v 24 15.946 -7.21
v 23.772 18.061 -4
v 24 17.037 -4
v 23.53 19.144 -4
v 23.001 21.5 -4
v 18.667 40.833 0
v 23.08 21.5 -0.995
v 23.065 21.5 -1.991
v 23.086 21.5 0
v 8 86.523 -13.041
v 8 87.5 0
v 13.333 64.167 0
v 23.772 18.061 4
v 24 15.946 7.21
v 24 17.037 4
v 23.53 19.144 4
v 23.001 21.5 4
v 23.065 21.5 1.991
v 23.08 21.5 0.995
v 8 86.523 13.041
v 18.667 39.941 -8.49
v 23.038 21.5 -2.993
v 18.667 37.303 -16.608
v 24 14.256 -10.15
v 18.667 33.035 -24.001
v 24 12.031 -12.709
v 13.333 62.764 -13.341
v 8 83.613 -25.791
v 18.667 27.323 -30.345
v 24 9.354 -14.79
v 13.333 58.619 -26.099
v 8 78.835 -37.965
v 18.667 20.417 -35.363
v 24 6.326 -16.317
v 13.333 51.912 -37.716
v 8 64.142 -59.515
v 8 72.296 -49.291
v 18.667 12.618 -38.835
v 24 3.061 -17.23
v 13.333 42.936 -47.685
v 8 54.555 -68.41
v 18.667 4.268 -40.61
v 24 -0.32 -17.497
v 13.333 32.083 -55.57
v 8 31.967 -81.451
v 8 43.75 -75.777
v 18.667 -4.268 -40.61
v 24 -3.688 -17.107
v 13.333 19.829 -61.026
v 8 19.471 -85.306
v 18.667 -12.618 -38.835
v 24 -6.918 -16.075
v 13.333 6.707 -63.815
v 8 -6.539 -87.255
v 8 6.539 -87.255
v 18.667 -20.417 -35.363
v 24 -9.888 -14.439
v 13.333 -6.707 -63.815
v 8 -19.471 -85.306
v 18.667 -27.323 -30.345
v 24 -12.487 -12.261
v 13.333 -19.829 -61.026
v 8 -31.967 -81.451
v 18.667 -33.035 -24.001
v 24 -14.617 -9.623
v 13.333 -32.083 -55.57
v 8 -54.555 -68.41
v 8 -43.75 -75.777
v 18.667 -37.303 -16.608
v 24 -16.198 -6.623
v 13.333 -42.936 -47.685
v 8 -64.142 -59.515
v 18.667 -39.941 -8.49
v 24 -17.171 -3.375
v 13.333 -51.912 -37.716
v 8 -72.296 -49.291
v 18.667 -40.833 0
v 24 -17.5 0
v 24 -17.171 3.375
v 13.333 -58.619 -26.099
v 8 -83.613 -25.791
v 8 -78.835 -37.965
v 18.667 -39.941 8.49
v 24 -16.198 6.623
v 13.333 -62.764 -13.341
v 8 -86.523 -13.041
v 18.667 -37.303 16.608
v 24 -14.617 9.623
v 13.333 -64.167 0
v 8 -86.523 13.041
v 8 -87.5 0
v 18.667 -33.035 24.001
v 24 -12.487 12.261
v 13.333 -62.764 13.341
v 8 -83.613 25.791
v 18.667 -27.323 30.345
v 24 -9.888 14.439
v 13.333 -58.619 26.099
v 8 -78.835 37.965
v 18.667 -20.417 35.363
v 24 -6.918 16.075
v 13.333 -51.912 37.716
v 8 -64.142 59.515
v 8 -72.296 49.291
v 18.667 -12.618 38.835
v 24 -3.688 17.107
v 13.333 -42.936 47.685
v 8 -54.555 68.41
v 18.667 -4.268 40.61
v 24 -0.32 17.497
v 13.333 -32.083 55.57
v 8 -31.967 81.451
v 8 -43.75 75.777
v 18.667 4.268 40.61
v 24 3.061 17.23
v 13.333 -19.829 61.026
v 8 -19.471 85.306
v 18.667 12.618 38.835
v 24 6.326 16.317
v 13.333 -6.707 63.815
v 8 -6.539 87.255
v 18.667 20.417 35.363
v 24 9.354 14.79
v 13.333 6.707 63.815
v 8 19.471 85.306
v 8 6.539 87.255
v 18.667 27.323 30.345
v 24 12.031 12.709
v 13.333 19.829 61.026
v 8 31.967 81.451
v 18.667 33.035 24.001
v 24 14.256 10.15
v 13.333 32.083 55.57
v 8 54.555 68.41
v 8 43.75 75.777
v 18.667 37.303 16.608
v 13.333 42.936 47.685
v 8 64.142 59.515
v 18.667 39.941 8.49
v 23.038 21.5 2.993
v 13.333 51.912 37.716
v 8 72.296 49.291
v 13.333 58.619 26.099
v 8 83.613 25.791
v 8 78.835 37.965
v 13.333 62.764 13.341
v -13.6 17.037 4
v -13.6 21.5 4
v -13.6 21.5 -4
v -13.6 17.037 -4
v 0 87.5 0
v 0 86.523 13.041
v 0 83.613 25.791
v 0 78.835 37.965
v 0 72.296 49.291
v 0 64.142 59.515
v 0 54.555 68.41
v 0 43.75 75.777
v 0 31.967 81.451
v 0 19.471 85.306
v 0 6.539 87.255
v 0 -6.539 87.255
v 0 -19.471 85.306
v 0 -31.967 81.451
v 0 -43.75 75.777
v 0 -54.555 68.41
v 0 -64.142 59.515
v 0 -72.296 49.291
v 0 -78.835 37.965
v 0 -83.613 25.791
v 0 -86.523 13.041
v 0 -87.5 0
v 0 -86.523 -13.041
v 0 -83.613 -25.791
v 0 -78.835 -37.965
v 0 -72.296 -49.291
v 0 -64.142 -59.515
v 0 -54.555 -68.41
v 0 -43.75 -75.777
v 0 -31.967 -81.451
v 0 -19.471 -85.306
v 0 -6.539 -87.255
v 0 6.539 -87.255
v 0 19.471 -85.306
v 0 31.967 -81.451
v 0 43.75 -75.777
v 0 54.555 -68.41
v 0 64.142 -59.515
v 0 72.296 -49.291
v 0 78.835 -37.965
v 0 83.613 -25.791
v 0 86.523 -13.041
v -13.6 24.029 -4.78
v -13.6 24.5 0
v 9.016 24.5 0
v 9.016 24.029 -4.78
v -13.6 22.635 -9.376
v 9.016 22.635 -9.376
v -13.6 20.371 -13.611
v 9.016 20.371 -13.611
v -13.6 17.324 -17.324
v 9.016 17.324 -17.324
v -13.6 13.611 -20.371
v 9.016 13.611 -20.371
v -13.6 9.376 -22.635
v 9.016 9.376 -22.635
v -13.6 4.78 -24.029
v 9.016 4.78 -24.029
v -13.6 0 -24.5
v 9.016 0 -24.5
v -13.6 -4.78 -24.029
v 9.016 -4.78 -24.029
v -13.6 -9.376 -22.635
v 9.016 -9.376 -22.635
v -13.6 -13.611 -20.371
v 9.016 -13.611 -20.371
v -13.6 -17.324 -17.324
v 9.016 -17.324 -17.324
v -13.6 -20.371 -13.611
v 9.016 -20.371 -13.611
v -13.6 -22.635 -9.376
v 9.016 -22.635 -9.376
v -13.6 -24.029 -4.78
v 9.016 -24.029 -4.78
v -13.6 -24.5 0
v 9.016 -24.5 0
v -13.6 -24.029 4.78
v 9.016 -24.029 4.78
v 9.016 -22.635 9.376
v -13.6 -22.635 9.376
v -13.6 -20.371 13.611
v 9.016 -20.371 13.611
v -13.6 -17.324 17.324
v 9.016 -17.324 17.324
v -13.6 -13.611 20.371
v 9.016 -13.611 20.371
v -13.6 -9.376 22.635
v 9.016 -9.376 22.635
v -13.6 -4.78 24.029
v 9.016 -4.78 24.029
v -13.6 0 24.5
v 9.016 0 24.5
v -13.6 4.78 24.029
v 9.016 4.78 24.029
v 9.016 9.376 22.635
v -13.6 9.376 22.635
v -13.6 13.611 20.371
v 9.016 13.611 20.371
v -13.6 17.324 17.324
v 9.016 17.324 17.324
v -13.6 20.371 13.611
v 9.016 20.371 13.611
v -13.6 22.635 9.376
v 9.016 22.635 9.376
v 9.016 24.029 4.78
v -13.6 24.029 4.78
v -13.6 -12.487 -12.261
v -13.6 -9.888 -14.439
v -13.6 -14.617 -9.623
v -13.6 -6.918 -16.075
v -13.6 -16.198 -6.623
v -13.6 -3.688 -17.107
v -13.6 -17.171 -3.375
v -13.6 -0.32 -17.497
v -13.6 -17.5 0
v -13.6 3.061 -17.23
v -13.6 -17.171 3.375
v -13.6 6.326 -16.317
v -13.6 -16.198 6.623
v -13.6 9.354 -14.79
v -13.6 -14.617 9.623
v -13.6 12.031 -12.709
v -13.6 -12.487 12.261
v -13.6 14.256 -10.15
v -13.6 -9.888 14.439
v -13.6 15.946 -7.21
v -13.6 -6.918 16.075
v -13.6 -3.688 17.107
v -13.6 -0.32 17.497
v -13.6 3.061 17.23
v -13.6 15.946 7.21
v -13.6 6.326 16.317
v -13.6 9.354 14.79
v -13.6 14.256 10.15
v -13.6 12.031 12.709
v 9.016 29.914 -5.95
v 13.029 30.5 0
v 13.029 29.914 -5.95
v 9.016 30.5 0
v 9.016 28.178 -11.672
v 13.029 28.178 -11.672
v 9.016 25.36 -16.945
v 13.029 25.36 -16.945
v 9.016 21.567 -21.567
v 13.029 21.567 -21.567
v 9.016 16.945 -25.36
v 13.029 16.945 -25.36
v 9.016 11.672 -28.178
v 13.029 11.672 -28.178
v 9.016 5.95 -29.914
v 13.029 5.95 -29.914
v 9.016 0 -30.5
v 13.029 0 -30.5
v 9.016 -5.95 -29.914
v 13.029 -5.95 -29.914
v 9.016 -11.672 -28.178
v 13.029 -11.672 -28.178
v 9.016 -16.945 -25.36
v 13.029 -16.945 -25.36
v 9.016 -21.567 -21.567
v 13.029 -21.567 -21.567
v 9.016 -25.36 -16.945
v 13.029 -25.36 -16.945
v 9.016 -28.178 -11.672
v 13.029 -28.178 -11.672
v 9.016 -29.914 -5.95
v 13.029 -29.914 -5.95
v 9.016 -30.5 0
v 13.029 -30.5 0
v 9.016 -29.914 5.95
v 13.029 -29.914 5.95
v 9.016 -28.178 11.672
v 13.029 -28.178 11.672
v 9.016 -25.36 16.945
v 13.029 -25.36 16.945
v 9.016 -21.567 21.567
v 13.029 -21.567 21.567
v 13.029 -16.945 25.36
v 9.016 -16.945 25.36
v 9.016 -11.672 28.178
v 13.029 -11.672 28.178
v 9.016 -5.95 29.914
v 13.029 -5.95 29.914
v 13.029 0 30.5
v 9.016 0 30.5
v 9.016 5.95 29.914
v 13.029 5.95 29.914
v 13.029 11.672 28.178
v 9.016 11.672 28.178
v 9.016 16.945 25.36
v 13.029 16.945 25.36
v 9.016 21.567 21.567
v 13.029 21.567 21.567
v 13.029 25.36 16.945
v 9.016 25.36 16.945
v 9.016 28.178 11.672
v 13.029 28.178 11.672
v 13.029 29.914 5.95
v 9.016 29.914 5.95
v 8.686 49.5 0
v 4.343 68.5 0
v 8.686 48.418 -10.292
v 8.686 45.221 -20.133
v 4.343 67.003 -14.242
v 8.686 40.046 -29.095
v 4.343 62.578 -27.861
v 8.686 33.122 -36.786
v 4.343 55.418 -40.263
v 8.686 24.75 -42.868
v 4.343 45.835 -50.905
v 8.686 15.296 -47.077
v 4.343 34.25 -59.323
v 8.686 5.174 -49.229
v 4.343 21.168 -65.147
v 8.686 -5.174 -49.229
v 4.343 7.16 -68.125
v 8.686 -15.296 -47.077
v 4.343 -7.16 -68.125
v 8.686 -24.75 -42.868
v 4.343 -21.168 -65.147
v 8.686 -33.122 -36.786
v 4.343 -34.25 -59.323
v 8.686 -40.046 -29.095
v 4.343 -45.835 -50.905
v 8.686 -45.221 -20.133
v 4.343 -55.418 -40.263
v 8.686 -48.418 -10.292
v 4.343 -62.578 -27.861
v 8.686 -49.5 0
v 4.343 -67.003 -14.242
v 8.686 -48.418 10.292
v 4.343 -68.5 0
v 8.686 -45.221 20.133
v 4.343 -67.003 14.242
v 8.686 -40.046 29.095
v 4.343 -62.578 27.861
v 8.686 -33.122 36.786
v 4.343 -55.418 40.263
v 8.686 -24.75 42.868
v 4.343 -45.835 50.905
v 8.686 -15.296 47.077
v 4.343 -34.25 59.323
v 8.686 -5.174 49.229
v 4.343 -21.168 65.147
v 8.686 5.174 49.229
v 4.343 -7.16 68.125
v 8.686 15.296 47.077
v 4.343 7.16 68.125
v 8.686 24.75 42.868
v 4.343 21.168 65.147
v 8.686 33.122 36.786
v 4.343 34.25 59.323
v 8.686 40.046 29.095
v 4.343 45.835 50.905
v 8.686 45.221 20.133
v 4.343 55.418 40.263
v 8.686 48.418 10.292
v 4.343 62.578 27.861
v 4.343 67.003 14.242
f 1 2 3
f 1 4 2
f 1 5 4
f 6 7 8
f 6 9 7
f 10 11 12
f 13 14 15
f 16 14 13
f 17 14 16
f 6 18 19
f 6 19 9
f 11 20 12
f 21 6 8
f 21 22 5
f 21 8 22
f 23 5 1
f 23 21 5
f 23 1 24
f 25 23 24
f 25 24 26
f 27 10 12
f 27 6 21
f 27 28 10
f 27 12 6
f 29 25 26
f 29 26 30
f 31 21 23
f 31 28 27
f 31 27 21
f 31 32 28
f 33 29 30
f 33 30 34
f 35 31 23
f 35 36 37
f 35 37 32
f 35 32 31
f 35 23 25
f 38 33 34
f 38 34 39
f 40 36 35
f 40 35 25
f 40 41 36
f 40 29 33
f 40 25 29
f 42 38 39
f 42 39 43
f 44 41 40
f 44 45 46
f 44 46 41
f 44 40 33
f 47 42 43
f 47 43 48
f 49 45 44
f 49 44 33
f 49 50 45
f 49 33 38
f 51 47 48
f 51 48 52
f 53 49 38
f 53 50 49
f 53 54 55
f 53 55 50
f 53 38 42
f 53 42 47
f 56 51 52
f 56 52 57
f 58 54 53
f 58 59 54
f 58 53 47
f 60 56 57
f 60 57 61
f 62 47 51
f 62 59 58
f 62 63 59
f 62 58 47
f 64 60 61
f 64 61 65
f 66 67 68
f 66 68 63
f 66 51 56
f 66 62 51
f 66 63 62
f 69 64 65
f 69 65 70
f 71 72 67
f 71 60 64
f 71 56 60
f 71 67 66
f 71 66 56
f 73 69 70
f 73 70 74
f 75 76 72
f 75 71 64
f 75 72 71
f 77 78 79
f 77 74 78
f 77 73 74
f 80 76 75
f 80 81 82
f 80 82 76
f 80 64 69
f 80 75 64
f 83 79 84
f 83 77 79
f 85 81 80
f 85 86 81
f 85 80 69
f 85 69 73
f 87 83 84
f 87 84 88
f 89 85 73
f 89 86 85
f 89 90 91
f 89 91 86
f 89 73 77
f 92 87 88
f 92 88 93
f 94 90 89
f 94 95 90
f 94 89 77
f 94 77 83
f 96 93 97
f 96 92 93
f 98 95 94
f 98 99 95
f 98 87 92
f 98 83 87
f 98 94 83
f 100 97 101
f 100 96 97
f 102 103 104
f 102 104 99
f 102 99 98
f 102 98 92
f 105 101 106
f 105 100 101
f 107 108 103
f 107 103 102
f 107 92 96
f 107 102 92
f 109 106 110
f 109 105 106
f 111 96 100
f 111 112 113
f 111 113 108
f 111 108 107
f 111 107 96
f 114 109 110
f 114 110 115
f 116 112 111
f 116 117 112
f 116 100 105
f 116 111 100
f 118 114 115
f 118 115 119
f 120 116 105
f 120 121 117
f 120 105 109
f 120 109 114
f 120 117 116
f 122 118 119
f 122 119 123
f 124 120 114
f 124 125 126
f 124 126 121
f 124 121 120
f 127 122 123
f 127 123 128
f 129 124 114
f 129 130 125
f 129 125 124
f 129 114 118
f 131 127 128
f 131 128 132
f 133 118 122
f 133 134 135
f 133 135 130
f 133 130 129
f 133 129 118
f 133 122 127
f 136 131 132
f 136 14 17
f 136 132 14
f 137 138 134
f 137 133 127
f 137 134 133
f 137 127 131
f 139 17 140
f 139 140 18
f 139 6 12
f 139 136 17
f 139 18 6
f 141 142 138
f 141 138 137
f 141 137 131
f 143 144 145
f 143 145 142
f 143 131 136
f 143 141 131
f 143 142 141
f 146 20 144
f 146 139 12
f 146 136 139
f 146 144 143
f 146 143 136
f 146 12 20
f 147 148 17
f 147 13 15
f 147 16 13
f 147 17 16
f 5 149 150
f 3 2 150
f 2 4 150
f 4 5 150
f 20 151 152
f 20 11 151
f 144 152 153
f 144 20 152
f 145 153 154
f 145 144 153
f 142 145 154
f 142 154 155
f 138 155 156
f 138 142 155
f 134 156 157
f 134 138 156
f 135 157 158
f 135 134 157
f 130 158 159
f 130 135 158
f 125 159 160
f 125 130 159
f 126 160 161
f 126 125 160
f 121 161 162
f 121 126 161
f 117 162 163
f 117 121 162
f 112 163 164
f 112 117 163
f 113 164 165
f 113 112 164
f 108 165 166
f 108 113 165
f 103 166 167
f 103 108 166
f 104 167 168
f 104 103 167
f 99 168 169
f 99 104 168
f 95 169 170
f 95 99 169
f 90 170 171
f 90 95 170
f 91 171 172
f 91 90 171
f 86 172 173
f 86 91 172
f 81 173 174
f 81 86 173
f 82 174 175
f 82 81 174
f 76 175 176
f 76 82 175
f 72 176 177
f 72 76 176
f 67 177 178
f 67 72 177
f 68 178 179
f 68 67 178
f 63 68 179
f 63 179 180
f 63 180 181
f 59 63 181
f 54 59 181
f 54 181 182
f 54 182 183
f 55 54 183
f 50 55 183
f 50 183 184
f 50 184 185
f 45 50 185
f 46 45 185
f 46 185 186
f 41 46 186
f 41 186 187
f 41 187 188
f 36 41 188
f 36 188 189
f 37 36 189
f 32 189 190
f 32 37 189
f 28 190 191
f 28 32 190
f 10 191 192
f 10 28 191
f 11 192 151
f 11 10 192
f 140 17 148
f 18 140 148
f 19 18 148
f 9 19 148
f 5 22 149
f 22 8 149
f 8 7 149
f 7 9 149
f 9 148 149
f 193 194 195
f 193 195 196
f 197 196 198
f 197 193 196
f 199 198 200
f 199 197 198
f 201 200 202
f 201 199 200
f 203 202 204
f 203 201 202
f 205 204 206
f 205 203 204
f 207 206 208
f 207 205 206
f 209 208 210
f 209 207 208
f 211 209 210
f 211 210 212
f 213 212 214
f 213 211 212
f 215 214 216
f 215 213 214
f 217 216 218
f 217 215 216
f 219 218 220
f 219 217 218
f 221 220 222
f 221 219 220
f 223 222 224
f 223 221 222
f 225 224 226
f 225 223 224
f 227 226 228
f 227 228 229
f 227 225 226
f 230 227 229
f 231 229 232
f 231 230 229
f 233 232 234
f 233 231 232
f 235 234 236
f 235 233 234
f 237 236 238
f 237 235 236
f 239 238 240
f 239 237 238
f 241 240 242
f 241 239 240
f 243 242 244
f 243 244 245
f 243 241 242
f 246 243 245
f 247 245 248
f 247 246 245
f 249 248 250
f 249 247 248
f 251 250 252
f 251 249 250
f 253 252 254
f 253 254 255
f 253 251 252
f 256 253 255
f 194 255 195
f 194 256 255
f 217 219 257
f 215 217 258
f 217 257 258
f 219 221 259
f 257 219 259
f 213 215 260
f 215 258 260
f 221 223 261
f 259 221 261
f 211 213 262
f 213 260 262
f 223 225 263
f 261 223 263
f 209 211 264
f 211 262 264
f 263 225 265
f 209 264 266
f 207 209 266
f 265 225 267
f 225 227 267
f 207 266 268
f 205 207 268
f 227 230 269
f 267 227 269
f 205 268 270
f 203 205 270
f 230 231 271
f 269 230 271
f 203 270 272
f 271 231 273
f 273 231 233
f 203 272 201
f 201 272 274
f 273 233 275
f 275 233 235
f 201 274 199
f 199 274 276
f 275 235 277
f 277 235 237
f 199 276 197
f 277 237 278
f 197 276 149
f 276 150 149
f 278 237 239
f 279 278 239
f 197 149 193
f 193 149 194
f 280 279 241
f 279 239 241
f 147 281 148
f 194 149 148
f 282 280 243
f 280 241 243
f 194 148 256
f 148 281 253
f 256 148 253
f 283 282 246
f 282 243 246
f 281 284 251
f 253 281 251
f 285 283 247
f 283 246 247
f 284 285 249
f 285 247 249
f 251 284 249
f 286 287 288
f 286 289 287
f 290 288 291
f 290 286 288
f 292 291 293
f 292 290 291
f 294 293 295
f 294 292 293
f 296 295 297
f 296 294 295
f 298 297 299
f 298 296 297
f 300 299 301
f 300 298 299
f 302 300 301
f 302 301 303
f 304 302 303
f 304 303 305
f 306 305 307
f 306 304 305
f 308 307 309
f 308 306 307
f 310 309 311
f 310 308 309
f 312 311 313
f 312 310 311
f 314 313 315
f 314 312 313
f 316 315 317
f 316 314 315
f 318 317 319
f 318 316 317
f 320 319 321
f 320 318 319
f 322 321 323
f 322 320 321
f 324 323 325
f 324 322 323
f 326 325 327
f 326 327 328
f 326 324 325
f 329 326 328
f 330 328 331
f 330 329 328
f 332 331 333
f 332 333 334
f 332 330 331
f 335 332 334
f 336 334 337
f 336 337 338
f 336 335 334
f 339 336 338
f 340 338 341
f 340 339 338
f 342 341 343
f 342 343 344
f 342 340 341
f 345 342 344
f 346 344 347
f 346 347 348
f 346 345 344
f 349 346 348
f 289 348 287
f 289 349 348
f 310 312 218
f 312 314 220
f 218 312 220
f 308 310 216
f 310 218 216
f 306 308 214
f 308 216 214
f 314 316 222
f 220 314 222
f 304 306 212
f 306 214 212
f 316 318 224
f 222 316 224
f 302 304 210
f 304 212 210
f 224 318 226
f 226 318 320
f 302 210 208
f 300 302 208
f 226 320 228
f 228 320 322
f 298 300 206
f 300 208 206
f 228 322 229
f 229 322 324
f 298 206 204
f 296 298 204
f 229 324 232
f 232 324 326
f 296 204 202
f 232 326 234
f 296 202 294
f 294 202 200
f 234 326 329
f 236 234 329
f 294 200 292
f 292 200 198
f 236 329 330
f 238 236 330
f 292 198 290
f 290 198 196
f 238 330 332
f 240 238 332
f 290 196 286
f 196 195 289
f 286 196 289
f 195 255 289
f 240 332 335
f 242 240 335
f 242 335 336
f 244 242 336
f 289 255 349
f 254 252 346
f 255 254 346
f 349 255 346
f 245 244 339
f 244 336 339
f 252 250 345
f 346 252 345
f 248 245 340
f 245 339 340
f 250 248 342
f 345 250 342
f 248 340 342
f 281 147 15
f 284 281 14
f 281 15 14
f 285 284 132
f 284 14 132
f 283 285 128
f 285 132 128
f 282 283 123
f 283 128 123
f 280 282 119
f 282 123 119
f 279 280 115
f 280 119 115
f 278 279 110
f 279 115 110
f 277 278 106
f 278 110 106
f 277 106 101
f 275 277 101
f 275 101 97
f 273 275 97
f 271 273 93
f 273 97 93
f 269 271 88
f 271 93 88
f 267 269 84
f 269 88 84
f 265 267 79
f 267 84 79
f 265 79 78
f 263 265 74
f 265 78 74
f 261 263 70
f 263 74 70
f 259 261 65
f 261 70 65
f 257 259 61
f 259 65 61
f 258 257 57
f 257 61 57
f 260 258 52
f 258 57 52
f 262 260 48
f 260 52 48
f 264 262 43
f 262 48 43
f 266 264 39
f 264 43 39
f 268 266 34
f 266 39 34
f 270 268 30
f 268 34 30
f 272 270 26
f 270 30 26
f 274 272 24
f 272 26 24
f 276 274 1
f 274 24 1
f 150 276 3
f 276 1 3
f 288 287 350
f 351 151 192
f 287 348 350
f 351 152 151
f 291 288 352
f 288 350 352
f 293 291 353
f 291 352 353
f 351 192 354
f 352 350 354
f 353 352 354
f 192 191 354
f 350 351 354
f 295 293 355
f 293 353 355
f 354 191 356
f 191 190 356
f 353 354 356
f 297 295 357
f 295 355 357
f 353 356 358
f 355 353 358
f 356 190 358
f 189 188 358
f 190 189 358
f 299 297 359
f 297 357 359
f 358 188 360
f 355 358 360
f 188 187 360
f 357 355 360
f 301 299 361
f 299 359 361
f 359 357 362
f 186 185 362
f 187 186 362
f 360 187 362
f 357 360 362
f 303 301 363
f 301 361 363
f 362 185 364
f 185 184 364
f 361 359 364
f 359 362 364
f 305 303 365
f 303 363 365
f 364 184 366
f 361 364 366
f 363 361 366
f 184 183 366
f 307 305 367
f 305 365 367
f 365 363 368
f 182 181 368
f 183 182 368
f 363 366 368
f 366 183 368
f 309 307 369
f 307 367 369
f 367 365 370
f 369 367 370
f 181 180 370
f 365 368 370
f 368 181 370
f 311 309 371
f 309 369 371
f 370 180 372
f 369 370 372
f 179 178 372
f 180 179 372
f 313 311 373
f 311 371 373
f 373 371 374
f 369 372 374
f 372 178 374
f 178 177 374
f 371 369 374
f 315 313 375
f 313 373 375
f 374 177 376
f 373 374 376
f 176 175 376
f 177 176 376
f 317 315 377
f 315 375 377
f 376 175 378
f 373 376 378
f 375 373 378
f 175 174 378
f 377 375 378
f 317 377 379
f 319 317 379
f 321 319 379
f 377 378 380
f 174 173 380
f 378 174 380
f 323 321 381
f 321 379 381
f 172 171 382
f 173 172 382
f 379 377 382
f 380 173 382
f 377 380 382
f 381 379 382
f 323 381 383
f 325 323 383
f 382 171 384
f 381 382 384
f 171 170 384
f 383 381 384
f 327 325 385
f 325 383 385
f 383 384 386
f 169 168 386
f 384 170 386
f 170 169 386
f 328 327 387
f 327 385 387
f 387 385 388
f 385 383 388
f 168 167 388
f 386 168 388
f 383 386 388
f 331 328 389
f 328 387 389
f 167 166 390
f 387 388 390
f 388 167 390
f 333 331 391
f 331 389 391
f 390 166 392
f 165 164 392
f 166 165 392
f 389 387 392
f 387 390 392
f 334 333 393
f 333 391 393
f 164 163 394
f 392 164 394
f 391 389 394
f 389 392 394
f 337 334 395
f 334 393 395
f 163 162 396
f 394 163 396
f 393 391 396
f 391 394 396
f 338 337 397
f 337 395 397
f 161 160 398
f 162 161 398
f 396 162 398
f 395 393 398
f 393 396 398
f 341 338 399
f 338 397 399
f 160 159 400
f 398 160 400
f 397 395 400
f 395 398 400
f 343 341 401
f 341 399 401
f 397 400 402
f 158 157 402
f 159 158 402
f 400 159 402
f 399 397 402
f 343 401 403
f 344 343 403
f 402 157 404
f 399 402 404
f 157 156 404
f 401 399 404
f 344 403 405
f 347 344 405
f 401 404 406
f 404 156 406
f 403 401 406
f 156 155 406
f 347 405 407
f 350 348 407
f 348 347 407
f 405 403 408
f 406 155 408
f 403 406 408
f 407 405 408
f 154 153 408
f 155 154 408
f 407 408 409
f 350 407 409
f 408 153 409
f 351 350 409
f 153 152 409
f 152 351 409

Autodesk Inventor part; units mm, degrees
ref_plane "YZ Plane" through (0, 0, 0) normal (1, 0, 0) x (0, 1, 0)
ref_plane "XZ Plane" through (0, 0, 0) normal (0, 1, 0) x (-1, 0, 0)
ref_plane "XY Plane" through (0, 0, 0) normal (0, 0, 1) x (1, 0, 0)
sketch "Sketch1" plane through (0, 0, 0) normal (0, 0, 1) x (1, 0, 0)
  line L0 (0, 87.5) -> (8, 87.5)
  line L1 (24, 0) -> (24, 17.5)
  line L2 (8, 87.5) -> (24, 17.5)
  line L3 (16, 0) -> (16, 17.5)
  line L4 (16, 17.5) -> (0, 87.5)
  line L5 (16, 0) -> (24, 0)
  point P0 (0, 0)
  dimension "d0" = 87.5
  dimension "d1" = 8
  dimension "d3" = 17.5
  dimension "d7" = 8
  dimension "d8" = 167.125
  dimension "d9" = 175
  dimension "d10" = 24
revolve "Revolution1" add sketch "Sketch1" angle 360 about axis through (16, 0, 0) along (1, 0, 0)
sketch "Sketch2" plane through (0, 0, 0) normal (0, 0, 1) x (1, 0, 0)
  line L0 (16, 0) -> (16, 24.5)
  line L1 (16, -17.5) -> (16, 17.5) projected
  line L2 (14.4, 24.5) -> (16, 24.5)
  line L3 (14.4, 24.5) -> (-13.6, 24.5)
  line L4 (-13.6, 24.5) -> (-13.6, 0)
  line L5 (-13.6, 0) -> (16, 0)
  point P0 (0, 0)
  dimension "d13" = 24.5
  dimension "d15" = 28
revolve "Revolution2" add sketch "Sketch2" angle 360 about axis through (-13.6, 0, 0) along (1, 0, 0)
sketch "Sketch3" plane through (0, 0, 0) normal (0, 0, 1) x (1, 0, 0)
  line L0 (14.4, 0) -> (14.4, 30.5)
  line L1 (14.4, 30.5) -> (13.0159, 30.5)
  line L2 (13.0159, 30.5) -> (9.0159, 30.5)
  line L3 (9.0159, 30.5) -> (9.0159, 0)
  line L4 (9.0159, 0) -> (14.4, 0)
  point P0 (0, 0)
  dimension "d17" = 30.5
  dimension "d18" = 4
revolve "Revolution3" add sketch "Sketch3" angle 360 about axis through (9.0159, 0, 0) along (1, 0, 0)
sketch "Sketch4" plane through (24, 0, 0) normal (1, 0, 0) x (0, 0, -1)
  circle A0 centre (0, 0) radius 17.5
extrude "Extrusion1" cut sketch "Sketch4" against normal through all
sketch "Sketch5" plane through (-13.6, 0, 0) normal (-1, 0, 0) x (0, 0, 1)
  circle A0 centre (0, 0) radius 17.5 projected
  line L0 (0, 21.5) -> (4, 21.5)
  line L1 (0, 21.5) -> (-4, 21.5)
  line L2 (-4, 21.5) -> (-4, 17.0367)
  line L3 (4, 21.5) -> (4, 17.0367)
  line L4 (-4, 17.0367) -> (4, 17.0367)
  dimension "d23" = 4
  dimension "d24" = 4
extrude "Extrusion2" cut sketch "Sketch5" against normal through all contours A0 L2 L1 L0 L3
properties part number "Nivelador de Correia"
